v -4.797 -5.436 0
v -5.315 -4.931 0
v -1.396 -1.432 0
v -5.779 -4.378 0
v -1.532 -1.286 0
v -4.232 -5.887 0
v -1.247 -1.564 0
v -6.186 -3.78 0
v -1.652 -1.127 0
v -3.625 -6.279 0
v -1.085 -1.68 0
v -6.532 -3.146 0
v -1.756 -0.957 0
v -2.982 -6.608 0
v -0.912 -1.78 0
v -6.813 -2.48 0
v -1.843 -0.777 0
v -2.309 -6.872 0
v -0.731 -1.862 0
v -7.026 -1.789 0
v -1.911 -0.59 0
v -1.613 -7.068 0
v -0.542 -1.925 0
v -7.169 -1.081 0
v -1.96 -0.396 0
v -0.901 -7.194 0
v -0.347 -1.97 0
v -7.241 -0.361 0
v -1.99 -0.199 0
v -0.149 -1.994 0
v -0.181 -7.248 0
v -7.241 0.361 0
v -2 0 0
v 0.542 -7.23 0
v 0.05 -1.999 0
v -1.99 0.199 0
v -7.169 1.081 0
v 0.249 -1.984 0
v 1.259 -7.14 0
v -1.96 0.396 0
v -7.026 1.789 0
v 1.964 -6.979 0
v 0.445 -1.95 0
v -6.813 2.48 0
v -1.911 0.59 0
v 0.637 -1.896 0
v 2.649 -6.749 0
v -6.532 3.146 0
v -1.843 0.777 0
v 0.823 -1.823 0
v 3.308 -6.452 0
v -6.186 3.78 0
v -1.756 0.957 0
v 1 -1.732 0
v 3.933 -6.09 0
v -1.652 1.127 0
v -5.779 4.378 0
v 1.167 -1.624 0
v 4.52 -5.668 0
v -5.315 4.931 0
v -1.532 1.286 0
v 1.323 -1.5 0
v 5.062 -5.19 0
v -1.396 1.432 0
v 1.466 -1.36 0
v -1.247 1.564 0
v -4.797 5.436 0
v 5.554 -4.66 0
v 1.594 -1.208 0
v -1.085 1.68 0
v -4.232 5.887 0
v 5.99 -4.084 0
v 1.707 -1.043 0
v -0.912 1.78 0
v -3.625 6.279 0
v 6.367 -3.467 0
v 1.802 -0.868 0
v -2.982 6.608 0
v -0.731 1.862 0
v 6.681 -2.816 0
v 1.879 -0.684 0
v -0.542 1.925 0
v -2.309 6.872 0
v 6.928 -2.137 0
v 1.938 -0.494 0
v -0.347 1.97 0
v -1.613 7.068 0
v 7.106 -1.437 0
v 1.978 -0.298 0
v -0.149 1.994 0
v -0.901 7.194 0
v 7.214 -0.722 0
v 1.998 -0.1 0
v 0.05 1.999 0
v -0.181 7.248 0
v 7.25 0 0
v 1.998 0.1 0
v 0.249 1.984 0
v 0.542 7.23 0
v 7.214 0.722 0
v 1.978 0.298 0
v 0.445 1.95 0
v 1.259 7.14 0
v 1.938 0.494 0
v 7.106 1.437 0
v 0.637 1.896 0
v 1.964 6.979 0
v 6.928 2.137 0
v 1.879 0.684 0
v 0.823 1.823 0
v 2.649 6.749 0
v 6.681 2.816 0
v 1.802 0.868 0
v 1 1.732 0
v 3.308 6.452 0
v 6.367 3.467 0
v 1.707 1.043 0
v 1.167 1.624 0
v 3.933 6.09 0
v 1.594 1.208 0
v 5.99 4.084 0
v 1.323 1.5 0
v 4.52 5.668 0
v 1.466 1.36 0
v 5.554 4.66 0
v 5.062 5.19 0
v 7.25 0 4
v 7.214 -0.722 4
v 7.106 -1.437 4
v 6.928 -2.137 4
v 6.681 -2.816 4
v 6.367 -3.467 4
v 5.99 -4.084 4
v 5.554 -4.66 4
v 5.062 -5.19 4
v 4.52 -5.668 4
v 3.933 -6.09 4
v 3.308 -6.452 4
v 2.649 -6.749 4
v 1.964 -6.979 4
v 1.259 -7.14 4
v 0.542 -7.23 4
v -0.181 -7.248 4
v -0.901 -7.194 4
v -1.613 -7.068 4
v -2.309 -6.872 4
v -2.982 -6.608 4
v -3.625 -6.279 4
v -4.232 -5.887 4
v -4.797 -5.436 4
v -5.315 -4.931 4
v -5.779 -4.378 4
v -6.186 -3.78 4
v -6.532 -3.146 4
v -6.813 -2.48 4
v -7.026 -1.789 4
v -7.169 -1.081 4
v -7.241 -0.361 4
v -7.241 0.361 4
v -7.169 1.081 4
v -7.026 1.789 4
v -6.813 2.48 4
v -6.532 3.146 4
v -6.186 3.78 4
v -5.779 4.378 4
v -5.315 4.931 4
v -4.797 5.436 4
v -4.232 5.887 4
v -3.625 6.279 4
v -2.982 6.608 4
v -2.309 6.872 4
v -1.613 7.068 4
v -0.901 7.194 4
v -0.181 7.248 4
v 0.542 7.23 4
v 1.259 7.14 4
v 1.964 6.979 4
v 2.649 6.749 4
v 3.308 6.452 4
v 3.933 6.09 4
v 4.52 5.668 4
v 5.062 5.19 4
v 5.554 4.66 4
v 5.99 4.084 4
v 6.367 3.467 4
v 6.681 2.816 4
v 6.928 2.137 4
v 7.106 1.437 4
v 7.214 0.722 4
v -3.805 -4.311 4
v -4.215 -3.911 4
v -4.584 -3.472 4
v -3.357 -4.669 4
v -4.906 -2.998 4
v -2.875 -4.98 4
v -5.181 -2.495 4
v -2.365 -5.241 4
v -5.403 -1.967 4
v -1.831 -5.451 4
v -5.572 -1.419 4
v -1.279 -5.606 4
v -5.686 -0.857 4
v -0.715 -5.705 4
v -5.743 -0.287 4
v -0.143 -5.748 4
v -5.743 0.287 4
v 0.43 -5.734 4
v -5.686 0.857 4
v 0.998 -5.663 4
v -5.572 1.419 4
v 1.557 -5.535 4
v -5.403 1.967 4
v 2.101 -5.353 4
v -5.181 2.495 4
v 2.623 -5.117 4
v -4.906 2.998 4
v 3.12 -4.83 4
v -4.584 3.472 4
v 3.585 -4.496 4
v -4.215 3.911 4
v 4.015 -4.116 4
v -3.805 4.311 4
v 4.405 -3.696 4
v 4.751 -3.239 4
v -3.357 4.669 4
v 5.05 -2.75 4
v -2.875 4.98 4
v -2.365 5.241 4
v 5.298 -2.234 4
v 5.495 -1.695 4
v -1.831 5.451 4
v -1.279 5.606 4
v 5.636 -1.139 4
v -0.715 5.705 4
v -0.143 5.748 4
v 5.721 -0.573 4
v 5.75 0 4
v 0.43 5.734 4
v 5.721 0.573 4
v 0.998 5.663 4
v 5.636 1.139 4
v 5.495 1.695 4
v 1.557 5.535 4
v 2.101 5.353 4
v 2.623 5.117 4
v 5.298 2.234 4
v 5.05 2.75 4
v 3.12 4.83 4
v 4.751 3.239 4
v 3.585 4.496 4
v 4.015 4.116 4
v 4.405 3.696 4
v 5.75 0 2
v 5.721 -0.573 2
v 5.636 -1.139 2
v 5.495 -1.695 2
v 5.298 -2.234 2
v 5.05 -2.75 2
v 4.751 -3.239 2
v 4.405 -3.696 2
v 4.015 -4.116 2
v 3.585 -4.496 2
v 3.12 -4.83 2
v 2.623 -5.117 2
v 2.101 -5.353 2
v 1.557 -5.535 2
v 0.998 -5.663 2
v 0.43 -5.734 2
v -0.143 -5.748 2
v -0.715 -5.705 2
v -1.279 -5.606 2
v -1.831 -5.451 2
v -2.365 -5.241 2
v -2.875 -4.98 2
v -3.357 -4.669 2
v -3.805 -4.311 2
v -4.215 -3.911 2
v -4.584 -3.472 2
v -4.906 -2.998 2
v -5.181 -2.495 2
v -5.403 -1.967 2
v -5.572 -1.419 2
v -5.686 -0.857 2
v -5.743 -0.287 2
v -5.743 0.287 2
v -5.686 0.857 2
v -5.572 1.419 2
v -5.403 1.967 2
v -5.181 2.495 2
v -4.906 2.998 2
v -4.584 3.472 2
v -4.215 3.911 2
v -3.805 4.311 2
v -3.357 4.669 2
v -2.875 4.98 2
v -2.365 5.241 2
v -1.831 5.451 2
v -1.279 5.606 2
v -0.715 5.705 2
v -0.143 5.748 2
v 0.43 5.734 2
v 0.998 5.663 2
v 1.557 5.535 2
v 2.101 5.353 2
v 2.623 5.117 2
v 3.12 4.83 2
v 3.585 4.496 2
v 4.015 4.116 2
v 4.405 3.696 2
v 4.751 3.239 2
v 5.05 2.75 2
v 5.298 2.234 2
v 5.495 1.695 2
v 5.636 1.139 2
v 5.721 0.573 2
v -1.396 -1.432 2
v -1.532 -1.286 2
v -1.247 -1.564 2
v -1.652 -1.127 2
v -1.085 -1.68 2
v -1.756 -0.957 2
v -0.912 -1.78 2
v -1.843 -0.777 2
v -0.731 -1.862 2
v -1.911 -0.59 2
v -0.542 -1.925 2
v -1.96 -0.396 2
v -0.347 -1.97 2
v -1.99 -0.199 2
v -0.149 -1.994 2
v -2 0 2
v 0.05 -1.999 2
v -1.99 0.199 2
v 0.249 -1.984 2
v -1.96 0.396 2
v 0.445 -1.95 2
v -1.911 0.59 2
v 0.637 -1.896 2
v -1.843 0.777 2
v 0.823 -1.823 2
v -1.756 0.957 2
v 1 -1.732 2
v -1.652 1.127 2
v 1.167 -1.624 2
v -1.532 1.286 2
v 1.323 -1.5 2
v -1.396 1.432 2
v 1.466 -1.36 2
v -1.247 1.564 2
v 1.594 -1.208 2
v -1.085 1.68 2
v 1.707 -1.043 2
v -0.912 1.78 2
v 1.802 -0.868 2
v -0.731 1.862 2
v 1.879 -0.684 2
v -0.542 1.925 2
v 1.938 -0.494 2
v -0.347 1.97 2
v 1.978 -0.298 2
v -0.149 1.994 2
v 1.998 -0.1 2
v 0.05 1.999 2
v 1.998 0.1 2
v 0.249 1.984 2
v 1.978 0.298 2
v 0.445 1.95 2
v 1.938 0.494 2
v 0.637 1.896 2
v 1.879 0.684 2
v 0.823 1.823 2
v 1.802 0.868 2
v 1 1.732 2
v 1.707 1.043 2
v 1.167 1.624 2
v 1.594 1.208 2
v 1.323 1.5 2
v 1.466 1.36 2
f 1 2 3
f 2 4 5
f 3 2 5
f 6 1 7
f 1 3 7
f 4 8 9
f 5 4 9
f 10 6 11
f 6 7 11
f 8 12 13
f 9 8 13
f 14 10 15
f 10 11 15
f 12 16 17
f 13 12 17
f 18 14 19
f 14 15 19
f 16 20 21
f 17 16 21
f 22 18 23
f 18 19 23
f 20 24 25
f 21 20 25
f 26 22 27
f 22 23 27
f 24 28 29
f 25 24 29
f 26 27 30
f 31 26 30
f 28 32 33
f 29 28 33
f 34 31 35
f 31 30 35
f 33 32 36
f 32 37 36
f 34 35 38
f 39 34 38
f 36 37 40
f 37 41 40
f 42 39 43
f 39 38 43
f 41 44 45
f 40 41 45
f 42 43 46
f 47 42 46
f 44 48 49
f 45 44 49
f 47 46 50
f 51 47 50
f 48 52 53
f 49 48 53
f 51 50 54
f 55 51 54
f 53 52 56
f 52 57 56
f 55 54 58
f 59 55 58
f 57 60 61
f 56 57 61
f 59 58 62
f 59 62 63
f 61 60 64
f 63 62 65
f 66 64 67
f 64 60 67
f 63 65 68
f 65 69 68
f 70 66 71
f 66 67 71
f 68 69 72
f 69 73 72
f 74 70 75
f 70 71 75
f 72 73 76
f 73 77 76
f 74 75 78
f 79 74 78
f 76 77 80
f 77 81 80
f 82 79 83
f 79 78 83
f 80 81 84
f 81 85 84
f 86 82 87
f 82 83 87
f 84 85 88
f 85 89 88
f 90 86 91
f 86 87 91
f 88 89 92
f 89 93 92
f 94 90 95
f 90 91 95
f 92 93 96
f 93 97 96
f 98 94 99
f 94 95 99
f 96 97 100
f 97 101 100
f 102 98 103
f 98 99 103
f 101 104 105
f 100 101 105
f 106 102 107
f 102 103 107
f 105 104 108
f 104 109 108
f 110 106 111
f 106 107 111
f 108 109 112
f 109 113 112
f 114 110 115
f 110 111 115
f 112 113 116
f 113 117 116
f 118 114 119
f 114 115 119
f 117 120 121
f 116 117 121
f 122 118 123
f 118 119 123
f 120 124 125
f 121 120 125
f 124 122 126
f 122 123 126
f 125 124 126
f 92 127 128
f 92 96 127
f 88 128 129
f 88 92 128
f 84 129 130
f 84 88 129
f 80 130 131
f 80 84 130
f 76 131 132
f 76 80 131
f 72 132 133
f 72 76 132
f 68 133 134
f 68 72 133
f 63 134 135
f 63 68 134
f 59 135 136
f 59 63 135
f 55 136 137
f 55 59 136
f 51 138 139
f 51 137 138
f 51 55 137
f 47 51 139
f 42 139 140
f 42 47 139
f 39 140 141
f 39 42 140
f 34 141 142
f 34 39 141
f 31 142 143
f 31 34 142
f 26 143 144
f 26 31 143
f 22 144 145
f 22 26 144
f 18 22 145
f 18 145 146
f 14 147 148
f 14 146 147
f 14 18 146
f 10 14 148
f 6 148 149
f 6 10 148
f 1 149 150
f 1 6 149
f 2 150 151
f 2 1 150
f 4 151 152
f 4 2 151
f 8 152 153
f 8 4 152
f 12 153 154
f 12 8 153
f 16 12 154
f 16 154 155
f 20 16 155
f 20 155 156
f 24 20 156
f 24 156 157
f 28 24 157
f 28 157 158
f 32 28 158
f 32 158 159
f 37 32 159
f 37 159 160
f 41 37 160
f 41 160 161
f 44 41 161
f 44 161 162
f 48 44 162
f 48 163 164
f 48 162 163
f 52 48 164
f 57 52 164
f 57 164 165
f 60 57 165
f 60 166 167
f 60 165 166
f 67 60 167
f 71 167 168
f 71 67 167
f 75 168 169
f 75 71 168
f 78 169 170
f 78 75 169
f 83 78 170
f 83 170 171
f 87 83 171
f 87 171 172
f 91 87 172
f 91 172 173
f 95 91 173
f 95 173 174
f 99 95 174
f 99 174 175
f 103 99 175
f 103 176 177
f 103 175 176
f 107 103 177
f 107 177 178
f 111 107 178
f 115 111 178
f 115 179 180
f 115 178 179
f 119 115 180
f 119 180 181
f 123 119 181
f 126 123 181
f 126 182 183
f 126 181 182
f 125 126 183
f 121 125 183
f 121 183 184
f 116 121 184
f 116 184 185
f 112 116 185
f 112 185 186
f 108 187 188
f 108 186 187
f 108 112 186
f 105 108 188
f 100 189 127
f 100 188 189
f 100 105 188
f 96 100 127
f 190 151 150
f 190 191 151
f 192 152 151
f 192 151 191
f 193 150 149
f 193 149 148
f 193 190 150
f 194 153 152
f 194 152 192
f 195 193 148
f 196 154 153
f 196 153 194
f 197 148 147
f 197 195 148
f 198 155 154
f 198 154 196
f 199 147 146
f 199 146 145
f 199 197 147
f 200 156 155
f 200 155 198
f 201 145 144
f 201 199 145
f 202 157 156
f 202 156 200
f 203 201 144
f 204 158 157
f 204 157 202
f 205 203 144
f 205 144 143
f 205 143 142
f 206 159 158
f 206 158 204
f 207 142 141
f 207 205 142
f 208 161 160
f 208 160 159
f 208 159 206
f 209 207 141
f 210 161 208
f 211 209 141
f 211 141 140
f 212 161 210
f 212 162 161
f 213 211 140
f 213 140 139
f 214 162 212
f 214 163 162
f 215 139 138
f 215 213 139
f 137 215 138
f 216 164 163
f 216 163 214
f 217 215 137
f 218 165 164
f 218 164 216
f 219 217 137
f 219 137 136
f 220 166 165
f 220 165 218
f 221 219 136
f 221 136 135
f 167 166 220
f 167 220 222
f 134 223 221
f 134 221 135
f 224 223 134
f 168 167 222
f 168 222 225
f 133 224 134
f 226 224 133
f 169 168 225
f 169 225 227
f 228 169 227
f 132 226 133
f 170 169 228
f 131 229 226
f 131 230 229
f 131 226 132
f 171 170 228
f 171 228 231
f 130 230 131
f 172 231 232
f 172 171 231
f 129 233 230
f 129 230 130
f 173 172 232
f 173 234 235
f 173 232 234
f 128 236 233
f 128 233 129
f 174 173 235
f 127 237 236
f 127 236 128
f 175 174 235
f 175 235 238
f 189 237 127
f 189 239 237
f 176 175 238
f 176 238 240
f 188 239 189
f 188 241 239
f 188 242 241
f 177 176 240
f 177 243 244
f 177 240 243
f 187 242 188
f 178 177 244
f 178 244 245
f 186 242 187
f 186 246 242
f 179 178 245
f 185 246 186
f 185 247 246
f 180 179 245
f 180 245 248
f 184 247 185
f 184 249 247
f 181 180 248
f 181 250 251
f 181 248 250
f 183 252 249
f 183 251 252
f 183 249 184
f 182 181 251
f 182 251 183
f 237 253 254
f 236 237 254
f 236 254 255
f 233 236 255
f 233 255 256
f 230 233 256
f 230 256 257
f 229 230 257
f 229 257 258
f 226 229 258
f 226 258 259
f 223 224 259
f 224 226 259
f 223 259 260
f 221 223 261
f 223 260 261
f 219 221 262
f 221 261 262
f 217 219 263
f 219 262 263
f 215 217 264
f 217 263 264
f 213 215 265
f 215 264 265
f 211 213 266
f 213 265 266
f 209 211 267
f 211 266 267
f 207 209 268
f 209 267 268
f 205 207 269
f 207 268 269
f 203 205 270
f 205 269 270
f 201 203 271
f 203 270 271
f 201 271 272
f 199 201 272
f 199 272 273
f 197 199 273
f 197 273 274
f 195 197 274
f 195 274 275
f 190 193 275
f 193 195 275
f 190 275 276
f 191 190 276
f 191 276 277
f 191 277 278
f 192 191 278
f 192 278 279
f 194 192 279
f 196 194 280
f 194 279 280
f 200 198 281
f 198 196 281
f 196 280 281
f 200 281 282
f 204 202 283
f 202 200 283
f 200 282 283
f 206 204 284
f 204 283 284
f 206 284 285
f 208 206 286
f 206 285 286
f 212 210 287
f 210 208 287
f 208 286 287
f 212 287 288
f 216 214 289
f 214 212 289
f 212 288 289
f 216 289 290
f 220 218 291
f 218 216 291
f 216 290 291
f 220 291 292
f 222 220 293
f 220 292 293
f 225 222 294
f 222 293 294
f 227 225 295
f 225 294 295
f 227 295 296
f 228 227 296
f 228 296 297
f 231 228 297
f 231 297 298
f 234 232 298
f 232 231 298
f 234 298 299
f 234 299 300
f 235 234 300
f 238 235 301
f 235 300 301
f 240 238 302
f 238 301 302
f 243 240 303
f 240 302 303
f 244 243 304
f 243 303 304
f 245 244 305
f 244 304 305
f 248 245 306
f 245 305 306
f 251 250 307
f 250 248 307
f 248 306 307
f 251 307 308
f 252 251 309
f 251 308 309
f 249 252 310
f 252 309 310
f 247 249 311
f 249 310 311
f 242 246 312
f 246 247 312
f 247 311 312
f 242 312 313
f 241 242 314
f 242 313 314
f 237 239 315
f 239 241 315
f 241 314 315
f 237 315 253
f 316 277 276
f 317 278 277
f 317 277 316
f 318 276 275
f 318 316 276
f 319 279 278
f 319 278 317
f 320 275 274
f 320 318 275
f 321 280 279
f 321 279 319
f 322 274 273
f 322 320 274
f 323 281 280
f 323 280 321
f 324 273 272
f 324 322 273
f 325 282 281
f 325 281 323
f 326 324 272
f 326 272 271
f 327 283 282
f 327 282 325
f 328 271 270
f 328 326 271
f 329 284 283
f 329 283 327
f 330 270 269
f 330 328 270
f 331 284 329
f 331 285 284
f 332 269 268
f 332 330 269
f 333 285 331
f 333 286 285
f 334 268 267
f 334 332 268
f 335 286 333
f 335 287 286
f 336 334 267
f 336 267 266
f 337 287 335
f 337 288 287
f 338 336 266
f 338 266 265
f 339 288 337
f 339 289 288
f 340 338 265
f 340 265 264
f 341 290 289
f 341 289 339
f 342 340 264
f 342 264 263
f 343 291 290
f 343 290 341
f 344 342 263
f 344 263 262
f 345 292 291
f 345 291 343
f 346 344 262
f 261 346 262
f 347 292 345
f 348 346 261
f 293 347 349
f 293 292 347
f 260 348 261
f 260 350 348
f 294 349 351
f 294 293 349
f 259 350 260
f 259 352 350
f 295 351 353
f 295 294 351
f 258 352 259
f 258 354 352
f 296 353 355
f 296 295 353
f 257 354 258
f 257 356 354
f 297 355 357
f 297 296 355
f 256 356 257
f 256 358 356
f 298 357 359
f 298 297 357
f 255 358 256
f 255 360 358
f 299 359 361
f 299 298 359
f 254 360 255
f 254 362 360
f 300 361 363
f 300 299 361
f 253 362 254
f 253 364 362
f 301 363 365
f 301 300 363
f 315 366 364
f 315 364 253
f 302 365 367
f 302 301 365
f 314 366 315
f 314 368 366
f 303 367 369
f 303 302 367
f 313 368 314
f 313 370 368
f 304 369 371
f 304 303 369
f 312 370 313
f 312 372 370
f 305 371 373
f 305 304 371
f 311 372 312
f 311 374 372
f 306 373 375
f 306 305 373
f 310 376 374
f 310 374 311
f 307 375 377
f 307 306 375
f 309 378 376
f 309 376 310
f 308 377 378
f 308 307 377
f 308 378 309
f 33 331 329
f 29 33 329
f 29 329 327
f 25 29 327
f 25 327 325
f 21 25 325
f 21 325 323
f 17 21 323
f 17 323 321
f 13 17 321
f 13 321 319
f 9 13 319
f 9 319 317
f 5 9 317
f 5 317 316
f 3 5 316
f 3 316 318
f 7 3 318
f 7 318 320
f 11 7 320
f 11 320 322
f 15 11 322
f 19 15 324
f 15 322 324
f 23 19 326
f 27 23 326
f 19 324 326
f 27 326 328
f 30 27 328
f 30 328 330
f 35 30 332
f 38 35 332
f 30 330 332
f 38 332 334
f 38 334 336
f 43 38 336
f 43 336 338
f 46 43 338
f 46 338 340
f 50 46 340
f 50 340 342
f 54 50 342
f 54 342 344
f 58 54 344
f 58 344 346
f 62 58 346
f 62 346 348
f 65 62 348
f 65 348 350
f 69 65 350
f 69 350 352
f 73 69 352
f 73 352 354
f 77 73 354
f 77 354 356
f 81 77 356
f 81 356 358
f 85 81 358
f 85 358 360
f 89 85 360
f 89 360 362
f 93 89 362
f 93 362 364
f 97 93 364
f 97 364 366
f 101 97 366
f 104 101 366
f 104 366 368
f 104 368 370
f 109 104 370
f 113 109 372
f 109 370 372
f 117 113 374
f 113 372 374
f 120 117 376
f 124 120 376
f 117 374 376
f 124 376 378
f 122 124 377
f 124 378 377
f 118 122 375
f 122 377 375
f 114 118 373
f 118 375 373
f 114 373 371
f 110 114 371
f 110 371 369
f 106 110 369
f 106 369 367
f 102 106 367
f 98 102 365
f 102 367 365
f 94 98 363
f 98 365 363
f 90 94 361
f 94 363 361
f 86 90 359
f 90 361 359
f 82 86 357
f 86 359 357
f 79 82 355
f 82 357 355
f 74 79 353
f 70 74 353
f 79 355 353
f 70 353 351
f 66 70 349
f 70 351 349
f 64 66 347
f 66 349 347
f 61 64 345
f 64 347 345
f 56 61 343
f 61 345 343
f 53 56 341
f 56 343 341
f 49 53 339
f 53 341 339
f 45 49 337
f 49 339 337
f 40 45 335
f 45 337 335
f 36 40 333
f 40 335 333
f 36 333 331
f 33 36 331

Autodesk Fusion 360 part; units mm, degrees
sketch "Sketch1" plane through (0, 0, 0) normal (0, 0, 1) x (1, 0, 0)
  circle A0 centre (0, 0) radius 5.75
  circle A1 centre (0, 0) radius 7.25
  dimension "d1" = 11.5
  dimension "d9" = 1.5
extrude "Extrude1" add sketch "Sketch1" along normal blind 4
extrude "Extrude2" add sketch "Sketch1" along normal blind 2 contours A0
sketch "Sketch2" plane through (0, 0, 2) normal (0, 0, 1) x (-1, 0, 0)
  circle A0 centre (0, 0) radius 5.75
  circle A1 centre (0, 0) radius 2
  dimension "d6" = 4
extrude "Extrude3" cut sketch "Sketch2" against normal blind 5 contours A1
